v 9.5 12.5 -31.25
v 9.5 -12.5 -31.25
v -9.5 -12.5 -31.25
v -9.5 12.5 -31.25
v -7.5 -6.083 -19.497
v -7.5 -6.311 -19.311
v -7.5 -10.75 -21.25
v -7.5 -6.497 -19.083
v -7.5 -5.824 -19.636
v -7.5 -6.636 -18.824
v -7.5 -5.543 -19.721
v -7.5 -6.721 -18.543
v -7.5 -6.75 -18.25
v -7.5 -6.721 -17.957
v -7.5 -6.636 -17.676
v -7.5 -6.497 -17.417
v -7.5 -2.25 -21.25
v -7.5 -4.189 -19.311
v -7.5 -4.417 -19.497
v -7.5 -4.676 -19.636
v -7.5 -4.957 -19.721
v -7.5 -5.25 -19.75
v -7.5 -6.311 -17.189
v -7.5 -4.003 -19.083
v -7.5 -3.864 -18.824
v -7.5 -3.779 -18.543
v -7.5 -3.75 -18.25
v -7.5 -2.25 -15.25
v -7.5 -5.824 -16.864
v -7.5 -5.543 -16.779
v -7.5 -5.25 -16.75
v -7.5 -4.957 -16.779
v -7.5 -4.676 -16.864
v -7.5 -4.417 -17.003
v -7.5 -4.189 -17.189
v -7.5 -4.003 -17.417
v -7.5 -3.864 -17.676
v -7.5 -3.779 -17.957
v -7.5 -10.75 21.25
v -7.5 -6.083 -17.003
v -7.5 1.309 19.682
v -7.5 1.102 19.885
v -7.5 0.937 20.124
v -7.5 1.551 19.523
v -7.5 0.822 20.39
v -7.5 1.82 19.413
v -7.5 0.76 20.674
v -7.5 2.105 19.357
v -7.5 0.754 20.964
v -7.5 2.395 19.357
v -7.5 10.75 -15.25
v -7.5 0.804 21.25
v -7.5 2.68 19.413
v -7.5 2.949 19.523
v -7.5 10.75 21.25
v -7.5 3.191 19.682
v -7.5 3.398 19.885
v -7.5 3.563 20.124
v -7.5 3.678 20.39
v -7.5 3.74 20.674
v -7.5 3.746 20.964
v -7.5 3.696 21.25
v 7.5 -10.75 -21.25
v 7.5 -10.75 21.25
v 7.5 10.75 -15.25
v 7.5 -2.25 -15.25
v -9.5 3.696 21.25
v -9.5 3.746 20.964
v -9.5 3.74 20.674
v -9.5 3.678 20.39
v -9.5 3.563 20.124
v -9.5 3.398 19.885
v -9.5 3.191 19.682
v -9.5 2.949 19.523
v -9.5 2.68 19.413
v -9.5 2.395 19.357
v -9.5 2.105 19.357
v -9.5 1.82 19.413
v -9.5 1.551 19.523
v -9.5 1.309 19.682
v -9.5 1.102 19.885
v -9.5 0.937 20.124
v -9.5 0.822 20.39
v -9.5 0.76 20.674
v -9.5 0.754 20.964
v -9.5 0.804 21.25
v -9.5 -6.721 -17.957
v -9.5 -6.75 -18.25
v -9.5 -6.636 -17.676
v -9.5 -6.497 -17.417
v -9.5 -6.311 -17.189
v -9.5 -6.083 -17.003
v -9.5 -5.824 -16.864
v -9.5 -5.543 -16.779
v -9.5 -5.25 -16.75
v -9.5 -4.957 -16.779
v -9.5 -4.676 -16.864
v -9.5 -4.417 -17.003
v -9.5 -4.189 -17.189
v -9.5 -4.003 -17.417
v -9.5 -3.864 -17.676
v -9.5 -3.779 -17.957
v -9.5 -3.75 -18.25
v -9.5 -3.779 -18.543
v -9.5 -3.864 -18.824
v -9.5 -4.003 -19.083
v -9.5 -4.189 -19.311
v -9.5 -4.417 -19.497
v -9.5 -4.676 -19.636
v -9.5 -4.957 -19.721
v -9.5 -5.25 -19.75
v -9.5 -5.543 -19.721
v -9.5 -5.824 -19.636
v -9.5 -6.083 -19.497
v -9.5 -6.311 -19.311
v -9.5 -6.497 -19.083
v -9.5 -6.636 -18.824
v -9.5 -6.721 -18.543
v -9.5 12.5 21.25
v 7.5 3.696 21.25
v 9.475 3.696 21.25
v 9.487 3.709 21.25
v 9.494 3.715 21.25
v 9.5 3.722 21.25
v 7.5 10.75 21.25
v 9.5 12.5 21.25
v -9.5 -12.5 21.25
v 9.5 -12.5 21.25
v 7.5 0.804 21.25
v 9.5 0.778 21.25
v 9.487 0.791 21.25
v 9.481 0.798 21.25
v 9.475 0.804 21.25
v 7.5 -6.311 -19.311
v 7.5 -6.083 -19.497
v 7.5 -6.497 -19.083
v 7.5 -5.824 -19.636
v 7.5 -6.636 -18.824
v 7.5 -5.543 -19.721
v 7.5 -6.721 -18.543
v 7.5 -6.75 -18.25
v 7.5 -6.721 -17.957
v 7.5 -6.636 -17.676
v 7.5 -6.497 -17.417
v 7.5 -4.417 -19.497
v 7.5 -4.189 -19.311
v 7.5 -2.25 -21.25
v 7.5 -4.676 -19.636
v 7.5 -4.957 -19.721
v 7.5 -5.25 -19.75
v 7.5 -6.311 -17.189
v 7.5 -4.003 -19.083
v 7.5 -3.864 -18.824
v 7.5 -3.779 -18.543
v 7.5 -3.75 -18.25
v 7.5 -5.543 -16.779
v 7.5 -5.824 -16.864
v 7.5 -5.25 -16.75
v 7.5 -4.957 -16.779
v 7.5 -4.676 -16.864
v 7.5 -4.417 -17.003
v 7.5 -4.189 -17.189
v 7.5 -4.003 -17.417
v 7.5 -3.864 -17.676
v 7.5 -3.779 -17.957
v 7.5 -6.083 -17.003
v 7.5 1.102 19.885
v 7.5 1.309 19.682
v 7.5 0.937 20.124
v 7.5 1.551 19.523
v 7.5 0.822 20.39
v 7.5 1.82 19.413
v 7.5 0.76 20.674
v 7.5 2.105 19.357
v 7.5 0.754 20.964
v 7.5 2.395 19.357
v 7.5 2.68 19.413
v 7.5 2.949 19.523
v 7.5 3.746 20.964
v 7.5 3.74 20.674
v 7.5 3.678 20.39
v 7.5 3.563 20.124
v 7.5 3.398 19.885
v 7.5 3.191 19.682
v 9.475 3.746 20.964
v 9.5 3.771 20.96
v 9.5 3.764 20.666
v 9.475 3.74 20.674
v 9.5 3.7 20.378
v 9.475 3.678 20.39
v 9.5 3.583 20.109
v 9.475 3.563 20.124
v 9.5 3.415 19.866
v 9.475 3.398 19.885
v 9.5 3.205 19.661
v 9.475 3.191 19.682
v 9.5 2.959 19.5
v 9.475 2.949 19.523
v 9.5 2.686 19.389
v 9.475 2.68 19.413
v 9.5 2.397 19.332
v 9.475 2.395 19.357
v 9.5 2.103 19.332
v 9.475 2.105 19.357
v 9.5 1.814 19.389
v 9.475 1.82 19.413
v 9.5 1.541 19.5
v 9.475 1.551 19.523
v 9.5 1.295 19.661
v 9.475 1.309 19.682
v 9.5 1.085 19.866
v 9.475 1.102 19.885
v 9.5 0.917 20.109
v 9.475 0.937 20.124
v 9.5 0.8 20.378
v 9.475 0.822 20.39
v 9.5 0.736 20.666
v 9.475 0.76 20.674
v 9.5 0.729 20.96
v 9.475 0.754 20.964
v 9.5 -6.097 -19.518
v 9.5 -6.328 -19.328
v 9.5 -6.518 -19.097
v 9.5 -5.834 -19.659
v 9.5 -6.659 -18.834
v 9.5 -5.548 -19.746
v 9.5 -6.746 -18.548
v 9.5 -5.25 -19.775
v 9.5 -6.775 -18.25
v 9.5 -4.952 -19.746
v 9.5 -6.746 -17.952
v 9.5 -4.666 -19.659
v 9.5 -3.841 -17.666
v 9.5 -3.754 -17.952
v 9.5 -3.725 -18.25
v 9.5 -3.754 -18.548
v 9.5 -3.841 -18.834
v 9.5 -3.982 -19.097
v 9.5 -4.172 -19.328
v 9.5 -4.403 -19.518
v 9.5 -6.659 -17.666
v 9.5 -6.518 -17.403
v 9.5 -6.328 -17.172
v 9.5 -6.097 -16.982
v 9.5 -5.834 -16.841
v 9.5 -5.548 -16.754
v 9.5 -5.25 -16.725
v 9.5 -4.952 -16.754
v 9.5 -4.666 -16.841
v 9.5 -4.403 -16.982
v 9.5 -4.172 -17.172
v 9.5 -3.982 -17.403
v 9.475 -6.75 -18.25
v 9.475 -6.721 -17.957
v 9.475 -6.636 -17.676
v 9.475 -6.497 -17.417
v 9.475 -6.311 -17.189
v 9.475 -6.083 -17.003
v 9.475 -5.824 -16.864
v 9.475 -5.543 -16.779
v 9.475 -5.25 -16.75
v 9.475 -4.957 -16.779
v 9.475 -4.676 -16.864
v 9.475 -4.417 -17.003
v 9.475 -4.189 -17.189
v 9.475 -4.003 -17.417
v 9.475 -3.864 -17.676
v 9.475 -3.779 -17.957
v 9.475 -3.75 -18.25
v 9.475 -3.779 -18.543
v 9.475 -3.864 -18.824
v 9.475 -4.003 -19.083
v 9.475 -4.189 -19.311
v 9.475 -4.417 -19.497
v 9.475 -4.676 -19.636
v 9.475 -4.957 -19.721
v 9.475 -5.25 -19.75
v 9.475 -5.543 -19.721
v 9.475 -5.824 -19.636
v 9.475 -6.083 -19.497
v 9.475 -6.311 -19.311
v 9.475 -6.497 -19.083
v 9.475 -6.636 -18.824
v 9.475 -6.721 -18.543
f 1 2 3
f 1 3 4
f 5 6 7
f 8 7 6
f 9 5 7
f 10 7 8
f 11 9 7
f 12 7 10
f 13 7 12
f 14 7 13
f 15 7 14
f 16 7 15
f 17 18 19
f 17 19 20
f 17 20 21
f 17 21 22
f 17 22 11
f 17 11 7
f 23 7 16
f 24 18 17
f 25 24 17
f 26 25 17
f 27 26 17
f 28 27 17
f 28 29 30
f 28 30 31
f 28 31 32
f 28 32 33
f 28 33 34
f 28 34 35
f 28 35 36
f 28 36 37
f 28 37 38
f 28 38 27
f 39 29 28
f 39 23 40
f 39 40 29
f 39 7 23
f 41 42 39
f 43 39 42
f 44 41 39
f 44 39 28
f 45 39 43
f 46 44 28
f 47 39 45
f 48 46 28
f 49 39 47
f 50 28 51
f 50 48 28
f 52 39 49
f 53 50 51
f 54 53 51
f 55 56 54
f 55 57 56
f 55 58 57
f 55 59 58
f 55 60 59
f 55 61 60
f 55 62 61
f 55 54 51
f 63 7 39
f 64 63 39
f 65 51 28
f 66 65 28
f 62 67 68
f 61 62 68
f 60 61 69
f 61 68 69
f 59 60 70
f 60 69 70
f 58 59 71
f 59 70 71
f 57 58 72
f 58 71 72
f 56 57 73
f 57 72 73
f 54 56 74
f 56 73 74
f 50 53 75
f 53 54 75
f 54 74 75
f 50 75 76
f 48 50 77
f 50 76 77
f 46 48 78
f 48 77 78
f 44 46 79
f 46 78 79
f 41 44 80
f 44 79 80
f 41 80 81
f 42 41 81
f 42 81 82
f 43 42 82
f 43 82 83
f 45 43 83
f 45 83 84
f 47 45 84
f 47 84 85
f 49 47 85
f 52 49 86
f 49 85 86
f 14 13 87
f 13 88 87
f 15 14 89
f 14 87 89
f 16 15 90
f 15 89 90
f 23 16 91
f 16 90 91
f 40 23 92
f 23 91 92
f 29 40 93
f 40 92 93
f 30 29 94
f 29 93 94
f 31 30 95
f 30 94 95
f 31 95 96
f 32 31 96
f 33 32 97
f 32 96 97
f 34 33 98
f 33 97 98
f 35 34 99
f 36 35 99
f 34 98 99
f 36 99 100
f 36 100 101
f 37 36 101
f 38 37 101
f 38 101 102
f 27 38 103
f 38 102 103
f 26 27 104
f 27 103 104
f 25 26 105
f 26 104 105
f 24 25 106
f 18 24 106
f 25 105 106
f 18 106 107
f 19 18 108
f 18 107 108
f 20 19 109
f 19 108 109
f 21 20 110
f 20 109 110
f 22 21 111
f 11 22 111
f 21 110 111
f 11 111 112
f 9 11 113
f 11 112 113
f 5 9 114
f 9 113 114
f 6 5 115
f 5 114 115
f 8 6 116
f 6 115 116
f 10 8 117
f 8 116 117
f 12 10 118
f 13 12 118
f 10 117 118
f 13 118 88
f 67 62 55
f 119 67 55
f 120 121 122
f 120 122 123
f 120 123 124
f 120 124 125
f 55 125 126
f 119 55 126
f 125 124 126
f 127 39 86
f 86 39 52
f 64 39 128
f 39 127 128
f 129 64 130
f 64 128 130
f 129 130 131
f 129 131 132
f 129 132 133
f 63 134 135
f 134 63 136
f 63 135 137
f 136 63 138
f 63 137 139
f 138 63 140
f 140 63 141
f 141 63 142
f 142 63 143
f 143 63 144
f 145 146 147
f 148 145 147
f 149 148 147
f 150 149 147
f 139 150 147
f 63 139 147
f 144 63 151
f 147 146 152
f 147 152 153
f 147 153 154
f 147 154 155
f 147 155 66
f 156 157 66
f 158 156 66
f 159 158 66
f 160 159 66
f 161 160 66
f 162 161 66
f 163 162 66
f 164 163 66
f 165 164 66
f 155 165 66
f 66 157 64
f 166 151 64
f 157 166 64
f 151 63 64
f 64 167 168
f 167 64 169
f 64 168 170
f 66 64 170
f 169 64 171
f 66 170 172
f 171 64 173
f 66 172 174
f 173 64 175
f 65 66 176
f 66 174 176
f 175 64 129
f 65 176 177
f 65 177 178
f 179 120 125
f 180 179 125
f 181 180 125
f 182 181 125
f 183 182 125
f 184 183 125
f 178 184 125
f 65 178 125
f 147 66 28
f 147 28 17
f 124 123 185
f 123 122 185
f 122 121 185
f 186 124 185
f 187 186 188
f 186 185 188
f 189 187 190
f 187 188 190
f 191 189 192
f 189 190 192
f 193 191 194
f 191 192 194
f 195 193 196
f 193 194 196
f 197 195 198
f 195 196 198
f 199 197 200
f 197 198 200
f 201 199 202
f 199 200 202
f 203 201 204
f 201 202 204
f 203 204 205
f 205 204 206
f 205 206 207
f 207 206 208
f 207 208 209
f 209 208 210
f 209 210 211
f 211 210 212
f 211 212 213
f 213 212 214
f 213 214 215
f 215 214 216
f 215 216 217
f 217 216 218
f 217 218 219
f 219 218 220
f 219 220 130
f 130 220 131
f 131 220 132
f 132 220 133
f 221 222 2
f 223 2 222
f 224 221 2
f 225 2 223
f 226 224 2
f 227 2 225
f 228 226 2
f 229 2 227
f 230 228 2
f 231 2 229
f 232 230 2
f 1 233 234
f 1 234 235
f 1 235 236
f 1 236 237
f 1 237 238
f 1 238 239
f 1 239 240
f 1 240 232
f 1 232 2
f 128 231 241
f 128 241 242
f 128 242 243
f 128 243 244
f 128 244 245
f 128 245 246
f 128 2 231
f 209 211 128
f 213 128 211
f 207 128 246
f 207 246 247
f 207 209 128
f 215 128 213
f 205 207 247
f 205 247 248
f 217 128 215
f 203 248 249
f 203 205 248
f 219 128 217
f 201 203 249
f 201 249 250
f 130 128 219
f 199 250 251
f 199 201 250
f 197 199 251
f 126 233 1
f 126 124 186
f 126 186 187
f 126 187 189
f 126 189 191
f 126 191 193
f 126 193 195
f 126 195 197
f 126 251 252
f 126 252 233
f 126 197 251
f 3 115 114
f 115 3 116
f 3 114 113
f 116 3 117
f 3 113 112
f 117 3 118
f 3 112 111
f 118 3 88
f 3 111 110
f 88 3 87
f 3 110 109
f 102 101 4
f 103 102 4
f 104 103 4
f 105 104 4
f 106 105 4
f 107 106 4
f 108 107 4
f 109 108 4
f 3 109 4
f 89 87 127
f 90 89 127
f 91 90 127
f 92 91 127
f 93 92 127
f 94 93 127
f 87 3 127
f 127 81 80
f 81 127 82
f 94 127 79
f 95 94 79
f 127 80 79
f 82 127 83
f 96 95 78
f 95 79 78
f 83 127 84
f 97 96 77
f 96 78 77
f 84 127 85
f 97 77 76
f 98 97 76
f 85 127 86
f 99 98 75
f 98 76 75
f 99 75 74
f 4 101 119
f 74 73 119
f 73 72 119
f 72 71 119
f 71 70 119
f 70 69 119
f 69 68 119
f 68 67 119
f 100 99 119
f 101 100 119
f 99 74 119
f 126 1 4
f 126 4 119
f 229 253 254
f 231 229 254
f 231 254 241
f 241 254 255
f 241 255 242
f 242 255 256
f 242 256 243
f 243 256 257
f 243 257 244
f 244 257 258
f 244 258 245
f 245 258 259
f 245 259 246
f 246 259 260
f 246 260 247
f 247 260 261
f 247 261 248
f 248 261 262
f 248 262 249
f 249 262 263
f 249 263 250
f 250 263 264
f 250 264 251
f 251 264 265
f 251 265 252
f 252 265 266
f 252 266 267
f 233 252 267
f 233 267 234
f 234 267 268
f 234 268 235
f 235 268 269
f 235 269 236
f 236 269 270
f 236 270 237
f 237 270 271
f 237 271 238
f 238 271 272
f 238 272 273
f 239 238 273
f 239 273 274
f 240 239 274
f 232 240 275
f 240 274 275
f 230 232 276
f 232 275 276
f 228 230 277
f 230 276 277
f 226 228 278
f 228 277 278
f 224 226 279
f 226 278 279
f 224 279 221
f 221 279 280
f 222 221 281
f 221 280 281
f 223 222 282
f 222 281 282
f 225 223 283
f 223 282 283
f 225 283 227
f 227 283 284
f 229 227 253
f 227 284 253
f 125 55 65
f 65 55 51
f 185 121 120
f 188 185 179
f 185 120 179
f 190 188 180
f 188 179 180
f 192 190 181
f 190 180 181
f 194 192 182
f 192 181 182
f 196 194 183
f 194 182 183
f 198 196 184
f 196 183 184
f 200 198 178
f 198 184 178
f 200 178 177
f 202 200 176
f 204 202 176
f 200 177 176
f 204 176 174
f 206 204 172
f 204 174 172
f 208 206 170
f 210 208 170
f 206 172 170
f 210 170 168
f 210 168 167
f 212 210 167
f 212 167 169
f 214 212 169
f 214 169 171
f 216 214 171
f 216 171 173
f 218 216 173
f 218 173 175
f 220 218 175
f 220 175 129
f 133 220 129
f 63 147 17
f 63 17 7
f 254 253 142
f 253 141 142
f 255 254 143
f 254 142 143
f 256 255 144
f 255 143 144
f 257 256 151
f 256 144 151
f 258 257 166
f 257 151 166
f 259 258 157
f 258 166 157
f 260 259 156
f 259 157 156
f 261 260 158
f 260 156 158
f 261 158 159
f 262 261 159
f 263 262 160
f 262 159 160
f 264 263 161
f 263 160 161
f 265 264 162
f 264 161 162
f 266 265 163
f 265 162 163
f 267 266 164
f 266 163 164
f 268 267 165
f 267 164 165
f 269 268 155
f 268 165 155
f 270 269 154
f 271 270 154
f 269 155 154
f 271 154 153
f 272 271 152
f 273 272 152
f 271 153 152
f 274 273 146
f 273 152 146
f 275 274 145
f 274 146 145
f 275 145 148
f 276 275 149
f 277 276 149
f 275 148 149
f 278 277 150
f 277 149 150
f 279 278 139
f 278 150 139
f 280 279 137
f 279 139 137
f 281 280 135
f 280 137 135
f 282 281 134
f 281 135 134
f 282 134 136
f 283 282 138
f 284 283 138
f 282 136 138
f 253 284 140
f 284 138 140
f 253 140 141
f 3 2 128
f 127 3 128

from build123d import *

# Parameters (mm, degrees)
BOSS_EXTRUDE1_DEPTH             = 7.5
BOSS_EXTRUDE1_DEPTH_BACK        = 7.5
SKETCH2_W                       = 25
SKETCH2_H                       = 52.5
BOSS_EXTRUDE2_DEPTH             = 2
F_3_0MM_DOWEL_HOLE1_D           = 3
F_3_0MM_DOWEL_HOLE1_CSINK_D     = 3.05
F_3_0MM_DOWEL_HOLE1_CSINK_ANGLE = 90


with BuildPart() as part:
    # Sketch1 → Boss-Extrude1 (new, two sides: drawn at the far end of the back side and taken through both)
    with BuildSketch(Plane.YZ.offset(-BOSS_EXTRUDE1_DEPTH_BACK)):
        Polygon((-10.75, -21.25), (-10.75, 21.25), (-12.5, 21.25), (-12.5, -31.25), (12.5, -31.25), (12.5, 21.25), (10.75, 21.25), (10.75, -15.25), (-2.25, -15.25), (-2.25, -21.25), align=None)
    extrude(amount=BOSS_EXTRUDE1_DEPTH + BOSS_EXTRUDE1_DEPTH_BACK)

    # Sketch2 → Boss-Extrude2 (add)
    with BuildSketch(Plane.YZ.offset(7.5)):
        with Locations((0, -5)):
            Rectangle(SKETCH2_W, SKETCH2_H)
    boss_extrude2 = extrude(amount=BOSS_EXTRUDE2_DEPTH)

    # Mirror2: Boss-Extrude2 across plane
    add(boss_extrude2.mirror(Plane(origin=(0, 0, 0), x_dir=(0, 0, 1), z_dir=(1, 0, 0))))

    # Ø3.0mm Dowel Hole1 (through all)
    with Locations(Plane.YZ.offset(9.5)):
        with Locations((2.25, 20.85), (-5.25, -18.25)):
            CounterSinkHole(F_3_0MM_DOWEL_HOLE1_D / 2, F_3_0MM_DOWEL_HOLE1_CSINK_D / 2, counter_sink_angle=F_3_0MM_DOWEL_HOLE1_CSINK_ANGLE)


solid = part.part
